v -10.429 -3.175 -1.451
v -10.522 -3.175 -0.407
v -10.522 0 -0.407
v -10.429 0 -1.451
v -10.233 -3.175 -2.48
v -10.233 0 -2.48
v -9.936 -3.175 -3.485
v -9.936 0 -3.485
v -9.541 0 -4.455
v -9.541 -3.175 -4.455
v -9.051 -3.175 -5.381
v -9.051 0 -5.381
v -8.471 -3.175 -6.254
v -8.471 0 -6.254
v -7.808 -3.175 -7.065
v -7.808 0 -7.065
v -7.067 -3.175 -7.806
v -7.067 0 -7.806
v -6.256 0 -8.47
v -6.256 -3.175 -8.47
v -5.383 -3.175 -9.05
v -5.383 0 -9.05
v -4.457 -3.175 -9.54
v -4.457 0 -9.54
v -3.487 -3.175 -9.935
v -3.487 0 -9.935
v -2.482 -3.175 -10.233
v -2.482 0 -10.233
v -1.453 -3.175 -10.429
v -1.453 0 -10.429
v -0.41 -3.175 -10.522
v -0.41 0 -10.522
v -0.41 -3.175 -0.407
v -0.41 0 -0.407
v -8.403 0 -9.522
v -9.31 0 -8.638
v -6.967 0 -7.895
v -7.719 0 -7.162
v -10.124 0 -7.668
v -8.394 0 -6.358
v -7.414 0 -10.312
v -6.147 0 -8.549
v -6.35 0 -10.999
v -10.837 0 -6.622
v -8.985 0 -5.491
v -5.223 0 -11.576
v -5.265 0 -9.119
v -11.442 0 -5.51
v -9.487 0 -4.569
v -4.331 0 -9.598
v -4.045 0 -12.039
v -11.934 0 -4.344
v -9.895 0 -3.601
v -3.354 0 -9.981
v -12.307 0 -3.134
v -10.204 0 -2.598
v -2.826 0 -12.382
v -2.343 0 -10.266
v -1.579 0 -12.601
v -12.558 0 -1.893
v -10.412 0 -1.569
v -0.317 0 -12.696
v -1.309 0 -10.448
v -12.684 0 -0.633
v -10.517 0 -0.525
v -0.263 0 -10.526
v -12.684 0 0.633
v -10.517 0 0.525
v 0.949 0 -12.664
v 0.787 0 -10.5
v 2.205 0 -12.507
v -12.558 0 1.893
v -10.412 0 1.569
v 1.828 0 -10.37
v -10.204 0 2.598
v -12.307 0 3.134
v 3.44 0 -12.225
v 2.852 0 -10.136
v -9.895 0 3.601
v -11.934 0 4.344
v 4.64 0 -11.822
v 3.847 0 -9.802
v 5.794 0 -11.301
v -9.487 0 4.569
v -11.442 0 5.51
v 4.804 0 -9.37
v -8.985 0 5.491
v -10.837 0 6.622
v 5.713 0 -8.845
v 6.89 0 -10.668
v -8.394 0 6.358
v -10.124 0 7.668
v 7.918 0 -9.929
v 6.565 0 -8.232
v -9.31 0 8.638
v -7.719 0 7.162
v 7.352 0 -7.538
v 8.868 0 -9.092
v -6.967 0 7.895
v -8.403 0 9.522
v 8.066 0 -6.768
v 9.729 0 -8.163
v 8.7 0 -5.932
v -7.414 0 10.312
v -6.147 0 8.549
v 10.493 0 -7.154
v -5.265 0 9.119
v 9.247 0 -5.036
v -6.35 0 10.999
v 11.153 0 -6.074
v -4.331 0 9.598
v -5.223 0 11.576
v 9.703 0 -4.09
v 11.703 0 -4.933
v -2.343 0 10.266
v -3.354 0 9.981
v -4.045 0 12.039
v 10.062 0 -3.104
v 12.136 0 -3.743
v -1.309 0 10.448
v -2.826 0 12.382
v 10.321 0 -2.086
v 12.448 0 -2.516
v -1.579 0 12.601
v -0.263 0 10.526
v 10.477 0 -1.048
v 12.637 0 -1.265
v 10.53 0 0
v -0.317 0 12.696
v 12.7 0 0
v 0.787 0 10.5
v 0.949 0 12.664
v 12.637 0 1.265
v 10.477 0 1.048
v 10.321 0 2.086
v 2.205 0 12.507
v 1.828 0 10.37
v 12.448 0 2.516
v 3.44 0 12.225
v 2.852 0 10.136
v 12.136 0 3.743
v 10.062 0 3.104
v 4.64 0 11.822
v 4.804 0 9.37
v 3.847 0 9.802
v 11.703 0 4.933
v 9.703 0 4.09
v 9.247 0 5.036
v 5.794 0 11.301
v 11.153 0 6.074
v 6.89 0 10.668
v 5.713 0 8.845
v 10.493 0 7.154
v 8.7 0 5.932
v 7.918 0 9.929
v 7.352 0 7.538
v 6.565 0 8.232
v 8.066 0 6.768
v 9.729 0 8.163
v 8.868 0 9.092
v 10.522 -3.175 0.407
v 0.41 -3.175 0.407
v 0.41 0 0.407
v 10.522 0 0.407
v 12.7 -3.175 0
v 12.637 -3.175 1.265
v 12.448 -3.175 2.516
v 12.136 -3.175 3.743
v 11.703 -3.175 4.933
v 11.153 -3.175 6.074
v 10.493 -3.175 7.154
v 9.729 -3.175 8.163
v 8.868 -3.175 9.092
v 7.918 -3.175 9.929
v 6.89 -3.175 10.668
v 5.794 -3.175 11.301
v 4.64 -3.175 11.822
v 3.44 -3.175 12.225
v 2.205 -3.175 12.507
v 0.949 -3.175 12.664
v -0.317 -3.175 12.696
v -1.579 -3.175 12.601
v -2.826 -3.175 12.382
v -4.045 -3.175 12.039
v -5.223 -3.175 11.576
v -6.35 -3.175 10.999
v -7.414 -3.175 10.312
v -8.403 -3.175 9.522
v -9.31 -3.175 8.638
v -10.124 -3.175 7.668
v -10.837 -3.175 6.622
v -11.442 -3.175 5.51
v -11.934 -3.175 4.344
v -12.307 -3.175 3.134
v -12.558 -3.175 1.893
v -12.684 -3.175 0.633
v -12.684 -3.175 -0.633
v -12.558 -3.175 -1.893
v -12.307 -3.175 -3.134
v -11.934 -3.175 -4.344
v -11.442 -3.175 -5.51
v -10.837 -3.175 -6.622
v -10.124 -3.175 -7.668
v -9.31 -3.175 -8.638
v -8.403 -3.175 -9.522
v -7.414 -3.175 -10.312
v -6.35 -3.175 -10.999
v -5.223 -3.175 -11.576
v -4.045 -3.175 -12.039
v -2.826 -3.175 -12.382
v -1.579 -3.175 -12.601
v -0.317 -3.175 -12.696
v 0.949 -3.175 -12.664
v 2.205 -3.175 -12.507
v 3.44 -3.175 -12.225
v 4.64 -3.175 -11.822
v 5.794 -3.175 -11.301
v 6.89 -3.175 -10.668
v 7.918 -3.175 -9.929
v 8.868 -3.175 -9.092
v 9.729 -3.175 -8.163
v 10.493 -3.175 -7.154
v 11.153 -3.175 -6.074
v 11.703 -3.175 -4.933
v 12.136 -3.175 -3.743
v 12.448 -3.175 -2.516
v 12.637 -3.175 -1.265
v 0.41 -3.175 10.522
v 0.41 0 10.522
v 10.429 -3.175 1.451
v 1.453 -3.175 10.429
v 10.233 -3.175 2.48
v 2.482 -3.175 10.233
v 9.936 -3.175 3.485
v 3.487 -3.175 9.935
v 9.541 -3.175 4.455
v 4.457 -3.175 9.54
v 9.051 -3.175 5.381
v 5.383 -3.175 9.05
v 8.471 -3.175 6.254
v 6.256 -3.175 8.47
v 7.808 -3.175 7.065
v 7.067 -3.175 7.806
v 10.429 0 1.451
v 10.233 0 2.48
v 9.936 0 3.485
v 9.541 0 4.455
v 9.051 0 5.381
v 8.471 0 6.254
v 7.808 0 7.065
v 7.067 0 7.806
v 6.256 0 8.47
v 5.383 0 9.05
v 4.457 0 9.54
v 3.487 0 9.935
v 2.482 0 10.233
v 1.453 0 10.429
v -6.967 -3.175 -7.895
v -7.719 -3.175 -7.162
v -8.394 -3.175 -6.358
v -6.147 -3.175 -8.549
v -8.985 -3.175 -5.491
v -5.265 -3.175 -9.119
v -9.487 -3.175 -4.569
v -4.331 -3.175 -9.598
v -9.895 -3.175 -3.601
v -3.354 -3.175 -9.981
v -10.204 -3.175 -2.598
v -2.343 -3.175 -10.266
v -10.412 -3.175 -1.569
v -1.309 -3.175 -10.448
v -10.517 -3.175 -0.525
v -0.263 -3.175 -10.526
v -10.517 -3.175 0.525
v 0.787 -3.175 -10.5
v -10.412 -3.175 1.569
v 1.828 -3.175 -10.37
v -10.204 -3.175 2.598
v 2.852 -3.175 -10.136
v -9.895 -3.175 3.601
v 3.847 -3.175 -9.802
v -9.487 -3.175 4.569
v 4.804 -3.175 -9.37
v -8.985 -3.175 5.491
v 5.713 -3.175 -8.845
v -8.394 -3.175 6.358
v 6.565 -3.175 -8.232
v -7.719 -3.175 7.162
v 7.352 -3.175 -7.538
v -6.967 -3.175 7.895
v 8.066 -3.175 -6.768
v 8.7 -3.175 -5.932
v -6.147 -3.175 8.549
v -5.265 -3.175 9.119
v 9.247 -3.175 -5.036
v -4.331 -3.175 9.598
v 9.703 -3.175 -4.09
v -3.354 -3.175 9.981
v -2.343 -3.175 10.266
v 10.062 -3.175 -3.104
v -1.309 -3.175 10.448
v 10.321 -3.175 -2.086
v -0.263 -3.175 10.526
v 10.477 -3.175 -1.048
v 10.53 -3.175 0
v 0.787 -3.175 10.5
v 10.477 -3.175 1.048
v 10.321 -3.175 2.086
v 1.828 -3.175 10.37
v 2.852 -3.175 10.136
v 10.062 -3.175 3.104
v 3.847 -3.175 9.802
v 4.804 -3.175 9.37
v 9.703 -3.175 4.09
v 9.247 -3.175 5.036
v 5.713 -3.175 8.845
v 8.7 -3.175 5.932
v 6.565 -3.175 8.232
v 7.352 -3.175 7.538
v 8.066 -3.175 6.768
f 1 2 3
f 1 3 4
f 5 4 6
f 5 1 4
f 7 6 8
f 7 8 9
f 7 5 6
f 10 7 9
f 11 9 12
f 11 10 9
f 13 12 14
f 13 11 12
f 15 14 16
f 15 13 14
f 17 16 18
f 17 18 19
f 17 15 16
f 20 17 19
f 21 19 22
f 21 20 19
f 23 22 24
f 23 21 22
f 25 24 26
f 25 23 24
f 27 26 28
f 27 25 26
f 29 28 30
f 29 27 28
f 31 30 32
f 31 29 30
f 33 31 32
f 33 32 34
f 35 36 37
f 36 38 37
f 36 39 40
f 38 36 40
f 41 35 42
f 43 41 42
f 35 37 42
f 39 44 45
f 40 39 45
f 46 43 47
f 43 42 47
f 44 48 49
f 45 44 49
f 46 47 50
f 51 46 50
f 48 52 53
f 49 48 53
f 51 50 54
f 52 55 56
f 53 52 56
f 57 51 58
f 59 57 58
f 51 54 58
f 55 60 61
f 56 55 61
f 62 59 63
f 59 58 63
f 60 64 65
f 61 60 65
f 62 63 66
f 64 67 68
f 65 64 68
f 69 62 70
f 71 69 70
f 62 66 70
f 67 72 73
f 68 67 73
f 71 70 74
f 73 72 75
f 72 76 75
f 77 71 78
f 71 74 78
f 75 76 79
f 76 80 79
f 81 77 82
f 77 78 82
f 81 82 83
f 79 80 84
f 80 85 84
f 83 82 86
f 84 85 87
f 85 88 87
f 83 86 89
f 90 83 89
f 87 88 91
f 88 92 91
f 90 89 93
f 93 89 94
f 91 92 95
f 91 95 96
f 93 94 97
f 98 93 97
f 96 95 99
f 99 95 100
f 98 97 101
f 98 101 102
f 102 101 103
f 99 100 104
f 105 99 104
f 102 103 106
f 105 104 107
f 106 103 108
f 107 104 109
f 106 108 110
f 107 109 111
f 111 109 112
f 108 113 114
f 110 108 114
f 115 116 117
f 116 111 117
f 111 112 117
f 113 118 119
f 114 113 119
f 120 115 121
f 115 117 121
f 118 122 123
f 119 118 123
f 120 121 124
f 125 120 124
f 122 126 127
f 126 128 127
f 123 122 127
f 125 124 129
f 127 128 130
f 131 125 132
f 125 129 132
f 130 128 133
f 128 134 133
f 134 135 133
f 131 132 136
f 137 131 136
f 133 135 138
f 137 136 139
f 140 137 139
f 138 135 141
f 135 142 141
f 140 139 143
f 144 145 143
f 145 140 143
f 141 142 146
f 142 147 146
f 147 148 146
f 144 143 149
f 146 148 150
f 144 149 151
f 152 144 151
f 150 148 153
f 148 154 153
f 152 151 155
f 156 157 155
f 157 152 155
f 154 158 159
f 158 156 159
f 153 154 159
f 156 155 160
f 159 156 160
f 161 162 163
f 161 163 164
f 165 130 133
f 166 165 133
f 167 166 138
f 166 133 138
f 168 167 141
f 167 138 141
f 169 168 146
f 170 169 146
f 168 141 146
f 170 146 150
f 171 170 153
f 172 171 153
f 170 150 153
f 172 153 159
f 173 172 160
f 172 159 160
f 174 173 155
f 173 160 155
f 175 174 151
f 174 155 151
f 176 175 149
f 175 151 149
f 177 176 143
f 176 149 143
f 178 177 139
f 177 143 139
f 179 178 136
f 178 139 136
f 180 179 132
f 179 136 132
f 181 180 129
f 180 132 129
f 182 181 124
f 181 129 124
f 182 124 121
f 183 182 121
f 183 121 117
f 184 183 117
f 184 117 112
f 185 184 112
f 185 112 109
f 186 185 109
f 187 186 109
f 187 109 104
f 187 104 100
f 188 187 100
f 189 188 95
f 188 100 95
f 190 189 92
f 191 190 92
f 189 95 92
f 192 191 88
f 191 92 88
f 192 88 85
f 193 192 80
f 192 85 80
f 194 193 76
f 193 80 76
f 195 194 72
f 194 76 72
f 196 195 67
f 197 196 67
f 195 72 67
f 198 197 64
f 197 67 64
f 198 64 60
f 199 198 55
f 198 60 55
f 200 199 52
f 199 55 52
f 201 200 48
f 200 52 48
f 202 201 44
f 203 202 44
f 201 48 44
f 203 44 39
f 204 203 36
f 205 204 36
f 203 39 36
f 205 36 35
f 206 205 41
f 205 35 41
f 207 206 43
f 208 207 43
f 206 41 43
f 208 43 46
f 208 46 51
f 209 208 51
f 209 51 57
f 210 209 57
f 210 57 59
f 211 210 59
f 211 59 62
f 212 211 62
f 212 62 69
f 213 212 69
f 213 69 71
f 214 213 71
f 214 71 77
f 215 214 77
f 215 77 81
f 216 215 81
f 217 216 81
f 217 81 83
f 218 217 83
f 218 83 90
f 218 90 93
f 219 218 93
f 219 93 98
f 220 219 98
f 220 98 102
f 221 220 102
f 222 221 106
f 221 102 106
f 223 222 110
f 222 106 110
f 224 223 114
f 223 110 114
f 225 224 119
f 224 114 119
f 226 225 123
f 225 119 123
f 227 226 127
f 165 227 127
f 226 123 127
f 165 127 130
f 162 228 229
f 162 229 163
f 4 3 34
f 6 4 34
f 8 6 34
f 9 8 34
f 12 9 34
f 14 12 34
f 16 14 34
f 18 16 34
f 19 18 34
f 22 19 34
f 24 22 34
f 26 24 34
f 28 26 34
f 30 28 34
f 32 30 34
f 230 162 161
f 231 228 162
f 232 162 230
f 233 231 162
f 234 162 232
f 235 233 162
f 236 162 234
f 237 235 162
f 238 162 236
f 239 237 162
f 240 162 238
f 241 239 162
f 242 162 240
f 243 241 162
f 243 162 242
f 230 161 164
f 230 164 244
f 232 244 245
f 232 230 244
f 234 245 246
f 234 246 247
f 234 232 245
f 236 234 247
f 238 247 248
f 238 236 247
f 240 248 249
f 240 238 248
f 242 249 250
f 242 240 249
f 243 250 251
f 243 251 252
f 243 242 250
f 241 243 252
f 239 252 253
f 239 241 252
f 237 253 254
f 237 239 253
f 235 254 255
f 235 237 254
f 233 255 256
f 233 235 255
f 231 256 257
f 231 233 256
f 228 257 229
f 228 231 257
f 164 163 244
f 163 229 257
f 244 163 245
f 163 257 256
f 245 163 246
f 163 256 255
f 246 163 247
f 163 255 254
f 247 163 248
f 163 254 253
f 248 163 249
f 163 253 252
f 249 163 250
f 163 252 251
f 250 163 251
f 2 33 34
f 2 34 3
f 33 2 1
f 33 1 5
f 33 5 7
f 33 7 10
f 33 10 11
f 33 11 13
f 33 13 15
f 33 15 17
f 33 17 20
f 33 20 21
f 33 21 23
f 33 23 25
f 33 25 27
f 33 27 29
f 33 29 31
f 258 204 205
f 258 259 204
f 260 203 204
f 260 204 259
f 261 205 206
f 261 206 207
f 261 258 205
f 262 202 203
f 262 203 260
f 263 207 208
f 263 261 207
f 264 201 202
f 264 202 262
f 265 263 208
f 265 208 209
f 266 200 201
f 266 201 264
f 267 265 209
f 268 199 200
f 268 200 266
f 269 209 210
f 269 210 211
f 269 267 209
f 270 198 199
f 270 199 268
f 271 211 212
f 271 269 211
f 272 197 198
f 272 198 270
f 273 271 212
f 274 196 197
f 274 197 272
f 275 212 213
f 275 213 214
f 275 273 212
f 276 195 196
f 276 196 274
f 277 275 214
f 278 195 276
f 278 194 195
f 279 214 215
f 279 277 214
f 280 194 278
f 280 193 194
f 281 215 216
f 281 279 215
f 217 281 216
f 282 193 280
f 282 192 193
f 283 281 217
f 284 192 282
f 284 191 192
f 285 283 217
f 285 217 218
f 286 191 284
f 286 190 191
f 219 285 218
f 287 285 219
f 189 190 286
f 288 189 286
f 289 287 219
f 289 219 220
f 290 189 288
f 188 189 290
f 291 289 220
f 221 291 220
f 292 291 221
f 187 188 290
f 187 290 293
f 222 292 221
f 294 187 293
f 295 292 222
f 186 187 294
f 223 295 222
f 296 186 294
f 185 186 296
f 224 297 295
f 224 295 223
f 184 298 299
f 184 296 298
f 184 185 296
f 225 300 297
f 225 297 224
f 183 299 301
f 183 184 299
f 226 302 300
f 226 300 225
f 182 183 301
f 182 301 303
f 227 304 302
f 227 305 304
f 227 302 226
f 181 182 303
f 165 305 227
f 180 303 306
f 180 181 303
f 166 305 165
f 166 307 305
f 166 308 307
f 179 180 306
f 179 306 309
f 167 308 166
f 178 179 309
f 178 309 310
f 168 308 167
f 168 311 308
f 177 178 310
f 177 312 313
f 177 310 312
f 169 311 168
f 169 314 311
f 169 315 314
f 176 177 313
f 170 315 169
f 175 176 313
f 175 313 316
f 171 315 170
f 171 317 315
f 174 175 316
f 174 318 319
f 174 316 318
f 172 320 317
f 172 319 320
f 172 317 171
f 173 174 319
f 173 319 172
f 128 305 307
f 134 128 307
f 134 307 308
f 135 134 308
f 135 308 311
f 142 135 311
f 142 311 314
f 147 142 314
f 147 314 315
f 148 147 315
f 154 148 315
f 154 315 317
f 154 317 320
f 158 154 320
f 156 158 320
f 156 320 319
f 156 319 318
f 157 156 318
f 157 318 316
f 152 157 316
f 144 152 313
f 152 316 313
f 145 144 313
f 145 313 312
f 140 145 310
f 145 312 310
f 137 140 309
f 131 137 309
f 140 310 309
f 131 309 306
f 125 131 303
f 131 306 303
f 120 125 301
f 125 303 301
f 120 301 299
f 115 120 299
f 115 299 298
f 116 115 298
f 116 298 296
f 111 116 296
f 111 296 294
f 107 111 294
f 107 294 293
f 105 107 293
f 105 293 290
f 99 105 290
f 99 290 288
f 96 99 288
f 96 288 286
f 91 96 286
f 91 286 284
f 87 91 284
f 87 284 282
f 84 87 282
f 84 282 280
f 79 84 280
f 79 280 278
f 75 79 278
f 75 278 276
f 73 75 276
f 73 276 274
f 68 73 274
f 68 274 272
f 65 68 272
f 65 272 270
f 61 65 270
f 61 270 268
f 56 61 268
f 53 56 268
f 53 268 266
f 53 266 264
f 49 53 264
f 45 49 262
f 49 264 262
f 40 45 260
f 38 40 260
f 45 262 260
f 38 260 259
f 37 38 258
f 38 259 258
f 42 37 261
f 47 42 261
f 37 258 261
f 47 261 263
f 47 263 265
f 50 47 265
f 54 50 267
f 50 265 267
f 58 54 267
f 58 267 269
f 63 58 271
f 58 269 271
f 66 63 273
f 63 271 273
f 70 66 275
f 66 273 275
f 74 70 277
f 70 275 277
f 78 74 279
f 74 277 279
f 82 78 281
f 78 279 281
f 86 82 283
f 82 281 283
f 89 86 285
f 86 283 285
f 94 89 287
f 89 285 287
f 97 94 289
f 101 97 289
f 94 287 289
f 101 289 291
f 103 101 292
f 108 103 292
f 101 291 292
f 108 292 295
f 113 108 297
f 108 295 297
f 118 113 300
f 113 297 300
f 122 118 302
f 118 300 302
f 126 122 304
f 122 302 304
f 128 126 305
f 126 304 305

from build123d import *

# Parameters (mm, degrees)
F0_R     = 12.7
F1_DEPTH = 3.175
F2_R     = 10.529660326
F3_DEPTH = 25.4
F5_DEPTH = 3.175


with BuildPart() as f1:
    # F0 (on Front) → F1 (new body)
    with BuildSketch(Plane.XZ):
        Circle(F0_R)
    extrude(amount=F1_DEPTH)

    # F2 (on face) → F3 (cut)
    with BuildSketch(Plane.XZ.offset(3.175)):
        Circle(F2_R)
    extrude(amount=-F3_DEPTH, mode=Mode.SUBTRACT)


with BuildPart() as f5:
    # F4 (on face) → F5 (new body)
    with BuildSketch(Plane.XZ.offset(3.175)):
        with BuildLine():
            Line((0.4095073219, 10.5216942711), (0.4095073219, 0.4073120146))
            Line((0.4095073219, 0.4073120146), (10.5217794837, 0.4073120146))
            ThreePointArc((10.5217794837, 0.4073120146), (7.4463709224, 7.4448174368), (0.4095073219, 10.5216942711))
        make_face()
    extrude(amount=-F5_DEPTH)


with BuildPart() as f5b:
    # F4 (on face) → F5, piece 2 (new body)
    with BuildSketch(Plane.XZ.offset(3.175)):
        with BuildLine():
            ThreePointArc((-10.5217794837, -0.4073120146), (-7.4463709224, -7.4448174368), (-0.4095073219, -10.5216942711))
            Line((-0.4095073219, -10.5216942711), (-0.4095073219, -0.4073120146))
            Line((-0.4095073219, -0.4073120146), (-10.5217794837, -0.4073120146))
        make_face()
    extrude(amount=-F5_DEPTH)


solid = Compound([f1.part, f5.part, f5b.part])
